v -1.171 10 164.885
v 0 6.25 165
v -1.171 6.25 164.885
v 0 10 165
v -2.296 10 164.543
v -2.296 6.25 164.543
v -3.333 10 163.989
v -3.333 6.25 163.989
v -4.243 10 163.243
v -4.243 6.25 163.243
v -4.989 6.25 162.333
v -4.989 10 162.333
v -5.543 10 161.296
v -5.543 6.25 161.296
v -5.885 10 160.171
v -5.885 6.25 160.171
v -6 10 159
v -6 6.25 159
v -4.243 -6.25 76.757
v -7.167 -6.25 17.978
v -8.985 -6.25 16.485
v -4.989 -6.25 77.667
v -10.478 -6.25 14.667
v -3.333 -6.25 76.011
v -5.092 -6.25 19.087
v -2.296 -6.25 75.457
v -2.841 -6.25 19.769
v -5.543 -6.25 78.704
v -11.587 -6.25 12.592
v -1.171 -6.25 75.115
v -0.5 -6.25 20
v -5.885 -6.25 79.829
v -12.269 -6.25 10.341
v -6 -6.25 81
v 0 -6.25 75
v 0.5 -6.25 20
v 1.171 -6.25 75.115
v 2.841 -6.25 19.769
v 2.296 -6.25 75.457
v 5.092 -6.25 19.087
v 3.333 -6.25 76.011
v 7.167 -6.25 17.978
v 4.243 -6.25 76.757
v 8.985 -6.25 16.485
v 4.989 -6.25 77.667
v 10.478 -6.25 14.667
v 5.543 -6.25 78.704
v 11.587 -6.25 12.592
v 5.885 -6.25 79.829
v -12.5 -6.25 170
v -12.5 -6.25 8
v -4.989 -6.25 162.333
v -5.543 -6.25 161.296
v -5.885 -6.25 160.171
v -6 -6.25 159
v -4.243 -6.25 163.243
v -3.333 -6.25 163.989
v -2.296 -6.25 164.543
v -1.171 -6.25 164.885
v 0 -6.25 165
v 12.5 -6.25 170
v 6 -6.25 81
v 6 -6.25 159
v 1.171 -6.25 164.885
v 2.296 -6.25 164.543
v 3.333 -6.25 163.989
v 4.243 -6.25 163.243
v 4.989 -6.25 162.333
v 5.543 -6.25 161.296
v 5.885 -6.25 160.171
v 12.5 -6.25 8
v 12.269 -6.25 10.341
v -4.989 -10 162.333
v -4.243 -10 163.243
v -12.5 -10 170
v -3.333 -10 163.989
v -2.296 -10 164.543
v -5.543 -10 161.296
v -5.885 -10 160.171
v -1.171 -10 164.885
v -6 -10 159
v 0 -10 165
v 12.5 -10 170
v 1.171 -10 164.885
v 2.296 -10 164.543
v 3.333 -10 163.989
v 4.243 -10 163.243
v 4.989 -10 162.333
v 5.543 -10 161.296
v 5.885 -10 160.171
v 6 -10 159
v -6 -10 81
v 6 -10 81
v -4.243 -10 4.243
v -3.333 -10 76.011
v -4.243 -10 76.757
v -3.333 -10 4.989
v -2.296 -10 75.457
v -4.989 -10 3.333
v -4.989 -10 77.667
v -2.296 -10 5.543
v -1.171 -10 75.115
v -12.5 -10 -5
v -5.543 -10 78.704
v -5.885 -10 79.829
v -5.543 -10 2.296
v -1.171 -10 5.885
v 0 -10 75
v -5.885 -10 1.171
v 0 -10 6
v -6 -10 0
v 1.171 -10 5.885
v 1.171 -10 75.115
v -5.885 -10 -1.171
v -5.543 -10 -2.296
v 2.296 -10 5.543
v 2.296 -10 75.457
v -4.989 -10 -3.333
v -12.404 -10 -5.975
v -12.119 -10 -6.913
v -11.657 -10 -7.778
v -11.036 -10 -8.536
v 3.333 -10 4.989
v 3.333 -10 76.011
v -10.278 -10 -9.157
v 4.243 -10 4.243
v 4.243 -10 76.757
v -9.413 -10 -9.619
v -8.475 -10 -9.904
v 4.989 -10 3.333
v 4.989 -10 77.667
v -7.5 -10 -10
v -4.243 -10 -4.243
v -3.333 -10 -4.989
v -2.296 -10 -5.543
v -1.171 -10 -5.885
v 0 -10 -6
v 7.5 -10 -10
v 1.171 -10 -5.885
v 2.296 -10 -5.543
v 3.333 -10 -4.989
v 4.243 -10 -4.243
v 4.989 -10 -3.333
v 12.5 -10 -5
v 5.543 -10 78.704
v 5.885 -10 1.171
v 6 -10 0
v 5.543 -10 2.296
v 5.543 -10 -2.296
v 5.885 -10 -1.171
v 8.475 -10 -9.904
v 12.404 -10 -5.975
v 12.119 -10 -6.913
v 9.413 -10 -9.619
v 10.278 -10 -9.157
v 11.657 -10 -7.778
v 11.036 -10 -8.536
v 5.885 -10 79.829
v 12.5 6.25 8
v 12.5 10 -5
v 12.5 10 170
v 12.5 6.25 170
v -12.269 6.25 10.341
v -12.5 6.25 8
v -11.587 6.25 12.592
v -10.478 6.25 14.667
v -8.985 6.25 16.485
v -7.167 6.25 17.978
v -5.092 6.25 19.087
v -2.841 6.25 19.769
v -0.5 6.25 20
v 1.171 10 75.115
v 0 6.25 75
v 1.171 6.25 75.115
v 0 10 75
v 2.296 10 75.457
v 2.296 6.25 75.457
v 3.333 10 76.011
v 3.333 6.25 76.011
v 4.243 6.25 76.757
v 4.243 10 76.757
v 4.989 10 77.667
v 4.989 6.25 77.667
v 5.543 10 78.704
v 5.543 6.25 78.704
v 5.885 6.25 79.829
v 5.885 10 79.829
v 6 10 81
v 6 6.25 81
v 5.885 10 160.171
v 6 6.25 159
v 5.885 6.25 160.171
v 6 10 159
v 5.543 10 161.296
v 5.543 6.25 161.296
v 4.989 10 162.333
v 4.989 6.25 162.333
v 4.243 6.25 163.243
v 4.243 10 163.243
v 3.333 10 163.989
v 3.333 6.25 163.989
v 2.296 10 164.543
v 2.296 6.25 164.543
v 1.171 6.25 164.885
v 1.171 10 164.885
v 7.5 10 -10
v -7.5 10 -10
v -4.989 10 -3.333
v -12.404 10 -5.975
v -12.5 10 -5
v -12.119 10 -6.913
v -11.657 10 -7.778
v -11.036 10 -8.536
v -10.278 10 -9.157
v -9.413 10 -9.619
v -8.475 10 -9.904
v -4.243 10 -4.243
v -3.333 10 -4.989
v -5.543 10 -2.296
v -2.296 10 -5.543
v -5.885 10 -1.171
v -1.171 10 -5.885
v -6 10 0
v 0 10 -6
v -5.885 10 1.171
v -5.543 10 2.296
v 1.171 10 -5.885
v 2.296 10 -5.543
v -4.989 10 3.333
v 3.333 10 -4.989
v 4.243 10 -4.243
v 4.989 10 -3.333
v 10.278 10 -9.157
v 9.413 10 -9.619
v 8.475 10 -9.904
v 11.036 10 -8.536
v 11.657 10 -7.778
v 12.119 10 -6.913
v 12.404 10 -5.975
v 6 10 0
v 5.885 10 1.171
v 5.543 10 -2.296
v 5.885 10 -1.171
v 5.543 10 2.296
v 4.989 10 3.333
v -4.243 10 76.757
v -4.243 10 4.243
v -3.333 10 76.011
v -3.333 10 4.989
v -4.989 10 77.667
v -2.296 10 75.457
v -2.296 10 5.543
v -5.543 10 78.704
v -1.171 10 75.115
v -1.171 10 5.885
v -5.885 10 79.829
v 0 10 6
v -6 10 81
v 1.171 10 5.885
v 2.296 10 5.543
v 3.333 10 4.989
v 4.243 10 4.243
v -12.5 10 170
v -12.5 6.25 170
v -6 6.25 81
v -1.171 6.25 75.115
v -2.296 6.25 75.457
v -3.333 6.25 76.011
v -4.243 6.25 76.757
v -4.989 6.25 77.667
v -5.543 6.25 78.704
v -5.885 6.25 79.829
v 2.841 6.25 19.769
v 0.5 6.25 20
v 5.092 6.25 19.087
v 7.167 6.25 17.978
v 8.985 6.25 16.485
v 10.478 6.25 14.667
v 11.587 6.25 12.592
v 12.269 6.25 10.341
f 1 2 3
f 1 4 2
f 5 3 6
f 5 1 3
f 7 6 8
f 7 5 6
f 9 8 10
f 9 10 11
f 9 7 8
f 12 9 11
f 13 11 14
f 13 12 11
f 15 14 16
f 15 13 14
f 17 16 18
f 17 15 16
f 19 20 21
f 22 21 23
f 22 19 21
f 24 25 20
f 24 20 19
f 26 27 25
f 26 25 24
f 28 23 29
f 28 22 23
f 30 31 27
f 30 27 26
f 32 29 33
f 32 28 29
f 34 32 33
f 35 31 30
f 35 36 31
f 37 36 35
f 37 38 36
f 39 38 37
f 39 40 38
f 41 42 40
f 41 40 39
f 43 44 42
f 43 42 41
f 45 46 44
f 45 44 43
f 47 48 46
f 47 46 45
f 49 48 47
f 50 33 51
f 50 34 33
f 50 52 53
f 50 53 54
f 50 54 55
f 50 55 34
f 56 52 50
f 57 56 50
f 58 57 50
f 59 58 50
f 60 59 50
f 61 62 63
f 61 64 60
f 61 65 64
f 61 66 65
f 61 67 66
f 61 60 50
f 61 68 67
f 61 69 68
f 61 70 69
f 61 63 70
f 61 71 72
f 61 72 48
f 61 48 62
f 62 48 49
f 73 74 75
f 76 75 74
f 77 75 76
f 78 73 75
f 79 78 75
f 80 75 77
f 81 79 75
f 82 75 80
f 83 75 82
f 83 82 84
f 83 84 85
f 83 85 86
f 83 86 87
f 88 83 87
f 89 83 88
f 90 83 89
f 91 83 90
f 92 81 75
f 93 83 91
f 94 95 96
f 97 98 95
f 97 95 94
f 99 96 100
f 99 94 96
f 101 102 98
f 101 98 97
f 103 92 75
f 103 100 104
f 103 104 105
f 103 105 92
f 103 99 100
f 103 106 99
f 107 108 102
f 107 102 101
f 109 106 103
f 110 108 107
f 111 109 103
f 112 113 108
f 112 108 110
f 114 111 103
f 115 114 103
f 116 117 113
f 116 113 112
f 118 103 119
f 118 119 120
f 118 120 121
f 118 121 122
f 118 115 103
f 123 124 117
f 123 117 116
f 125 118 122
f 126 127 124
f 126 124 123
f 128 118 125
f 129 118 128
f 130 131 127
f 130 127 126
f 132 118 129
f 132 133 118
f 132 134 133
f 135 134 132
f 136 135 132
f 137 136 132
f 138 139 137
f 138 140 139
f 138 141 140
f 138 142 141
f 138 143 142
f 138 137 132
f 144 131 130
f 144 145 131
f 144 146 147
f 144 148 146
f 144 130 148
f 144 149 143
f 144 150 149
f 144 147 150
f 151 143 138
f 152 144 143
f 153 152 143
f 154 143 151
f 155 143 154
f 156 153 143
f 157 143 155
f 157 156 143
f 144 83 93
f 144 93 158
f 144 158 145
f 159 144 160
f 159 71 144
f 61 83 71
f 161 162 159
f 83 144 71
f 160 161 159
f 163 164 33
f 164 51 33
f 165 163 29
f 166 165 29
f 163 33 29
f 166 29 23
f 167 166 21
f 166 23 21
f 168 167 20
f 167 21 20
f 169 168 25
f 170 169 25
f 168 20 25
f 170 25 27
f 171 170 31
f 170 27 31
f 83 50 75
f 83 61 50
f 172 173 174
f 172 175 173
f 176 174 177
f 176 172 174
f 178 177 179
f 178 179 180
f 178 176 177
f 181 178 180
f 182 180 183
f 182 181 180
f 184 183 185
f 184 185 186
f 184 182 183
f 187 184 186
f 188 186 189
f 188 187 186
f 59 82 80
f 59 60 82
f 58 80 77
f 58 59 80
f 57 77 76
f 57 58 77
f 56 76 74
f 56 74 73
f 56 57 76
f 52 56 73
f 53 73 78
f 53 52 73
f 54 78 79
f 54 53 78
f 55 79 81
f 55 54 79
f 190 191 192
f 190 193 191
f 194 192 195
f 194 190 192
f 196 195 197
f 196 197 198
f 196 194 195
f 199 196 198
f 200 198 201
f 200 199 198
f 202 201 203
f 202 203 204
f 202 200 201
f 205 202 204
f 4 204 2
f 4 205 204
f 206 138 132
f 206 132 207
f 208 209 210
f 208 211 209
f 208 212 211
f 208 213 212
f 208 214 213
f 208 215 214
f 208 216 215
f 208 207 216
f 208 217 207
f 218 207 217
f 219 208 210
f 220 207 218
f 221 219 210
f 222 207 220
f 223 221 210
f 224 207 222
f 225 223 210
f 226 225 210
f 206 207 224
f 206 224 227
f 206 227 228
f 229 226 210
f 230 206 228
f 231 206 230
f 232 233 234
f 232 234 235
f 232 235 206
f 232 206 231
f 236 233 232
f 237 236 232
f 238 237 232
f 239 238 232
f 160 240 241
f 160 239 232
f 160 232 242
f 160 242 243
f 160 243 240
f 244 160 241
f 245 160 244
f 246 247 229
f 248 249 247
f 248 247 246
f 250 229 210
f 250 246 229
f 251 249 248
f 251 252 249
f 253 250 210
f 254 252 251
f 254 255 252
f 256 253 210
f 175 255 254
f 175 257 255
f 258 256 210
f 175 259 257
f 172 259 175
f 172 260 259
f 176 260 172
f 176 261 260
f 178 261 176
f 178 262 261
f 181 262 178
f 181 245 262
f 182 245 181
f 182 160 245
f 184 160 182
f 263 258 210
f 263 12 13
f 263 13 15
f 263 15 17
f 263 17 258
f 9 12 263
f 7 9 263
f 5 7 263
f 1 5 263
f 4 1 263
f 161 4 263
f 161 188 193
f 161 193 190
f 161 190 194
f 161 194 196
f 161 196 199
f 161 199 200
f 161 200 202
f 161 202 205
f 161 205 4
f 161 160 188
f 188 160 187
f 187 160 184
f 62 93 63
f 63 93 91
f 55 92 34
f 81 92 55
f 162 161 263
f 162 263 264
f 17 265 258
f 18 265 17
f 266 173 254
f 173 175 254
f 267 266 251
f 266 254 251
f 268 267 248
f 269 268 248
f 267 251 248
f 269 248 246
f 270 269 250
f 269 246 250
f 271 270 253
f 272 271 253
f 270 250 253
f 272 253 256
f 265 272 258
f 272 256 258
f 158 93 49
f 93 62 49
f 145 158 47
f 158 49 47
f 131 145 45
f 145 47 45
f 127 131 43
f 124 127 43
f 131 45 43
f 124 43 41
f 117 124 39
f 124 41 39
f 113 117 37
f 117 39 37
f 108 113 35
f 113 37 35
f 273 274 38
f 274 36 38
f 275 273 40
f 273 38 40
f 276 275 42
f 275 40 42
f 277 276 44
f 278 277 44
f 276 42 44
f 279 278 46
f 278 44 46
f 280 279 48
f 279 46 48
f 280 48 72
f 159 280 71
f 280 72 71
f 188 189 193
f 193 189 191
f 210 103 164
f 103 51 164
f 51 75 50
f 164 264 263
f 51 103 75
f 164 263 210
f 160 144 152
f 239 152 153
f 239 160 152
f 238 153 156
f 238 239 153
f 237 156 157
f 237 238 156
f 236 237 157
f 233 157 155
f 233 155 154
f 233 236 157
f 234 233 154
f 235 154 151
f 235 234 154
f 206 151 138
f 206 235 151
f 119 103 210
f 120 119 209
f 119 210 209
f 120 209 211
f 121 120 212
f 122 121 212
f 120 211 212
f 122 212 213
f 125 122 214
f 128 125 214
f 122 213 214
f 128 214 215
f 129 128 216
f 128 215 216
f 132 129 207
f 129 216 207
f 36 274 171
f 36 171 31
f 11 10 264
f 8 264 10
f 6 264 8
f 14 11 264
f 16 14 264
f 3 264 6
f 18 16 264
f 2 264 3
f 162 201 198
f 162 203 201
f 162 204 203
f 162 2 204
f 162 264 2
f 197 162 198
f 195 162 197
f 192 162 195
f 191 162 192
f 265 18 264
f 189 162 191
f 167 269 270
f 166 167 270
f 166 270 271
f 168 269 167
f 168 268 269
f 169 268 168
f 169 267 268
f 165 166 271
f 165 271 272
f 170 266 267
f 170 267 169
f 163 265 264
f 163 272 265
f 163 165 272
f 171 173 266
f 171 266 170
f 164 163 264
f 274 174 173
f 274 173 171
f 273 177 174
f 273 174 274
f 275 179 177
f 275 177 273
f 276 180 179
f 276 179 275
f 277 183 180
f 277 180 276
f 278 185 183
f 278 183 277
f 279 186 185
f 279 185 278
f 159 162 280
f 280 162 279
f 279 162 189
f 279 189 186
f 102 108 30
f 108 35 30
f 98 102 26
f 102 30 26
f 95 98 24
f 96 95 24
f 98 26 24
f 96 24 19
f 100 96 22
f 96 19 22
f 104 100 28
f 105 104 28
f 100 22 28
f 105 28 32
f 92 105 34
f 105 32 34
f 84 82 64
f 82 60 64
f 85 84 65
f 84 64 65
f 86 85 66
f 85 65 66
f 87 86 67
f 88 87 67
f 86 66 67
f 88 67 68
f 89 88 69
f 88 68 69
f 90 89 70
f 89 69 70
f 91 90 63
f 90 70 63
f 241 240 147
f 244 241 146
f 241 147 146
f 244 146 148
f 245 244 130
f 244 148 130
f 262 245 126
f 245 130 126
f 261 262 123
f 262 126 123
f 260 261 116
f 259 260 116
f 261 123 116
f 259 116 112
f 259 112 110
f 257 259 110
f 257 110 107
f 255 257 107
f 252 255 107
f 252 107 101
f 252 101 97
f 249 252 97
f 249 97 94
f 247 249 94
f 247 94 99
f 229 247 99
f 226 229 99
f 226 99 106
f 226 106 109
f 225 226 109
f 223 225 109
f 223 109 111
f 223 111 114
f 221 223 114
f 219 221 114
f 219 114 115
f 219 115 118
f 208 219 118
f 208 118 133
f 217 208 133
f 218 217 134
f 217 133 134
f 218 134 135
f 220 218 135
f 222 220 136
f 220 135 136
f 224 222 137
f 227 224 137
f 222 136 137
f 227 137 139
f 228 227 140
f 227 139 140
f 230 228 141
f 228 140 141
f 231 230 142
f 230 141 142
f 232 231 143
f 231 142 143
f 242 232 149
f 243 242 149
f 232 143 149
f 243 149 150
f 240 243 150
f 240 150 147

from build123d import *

# Parameters (mm, degrees)
F1_DEPTH = 12.5
F2_R     = 6
F3_DEPTH = 20.001
F4_R     = 5
F5_R     = 12
F6_W     = 12
F6_H     = 90
F7_DEPTH = 20.001
F8_R     = 5.99999


# Not quite as in the source:
# - a fillet or chamfer is up to 0.001 mm smaller than in the source, because OpenCascade refuses the exact size


with BuildPart() as f1:
    # F0 (on Right) → F1 (new body, symmetric)
    with BuildSketch(Plane.YZ):
        Polygon((-6.25, 170), (-10, 170), (-10, -10), (10, -10), (10, 170), (6.25, 170), (6.25, 20), (-6.25, 20), align=None)
    extrude(amount=F1_DEPTH, both=True)

    # F2 (on face) → F3 (cut, through all)
    with BuildSketch(Plane.XZ.offset(10)):
        Circle(F2_R)
    extrude(amount=-F3_DEPTH, mode=Mode.SUBTRACT)

    # F4
    f4_edges = [f1.edges().sort_by_distance(p)[0] for p in [
        (12.5, 0, -10),
        (-12.5, 0, -10),
    ]]
    fillet(f4_edges, radius=F4_R)

    # F5
    f5_edges = [f1.edges().sort_by_distance(p)[0] for p in [
        (12.5, 0, 20),
        (-12.5, 0, 20),
    ]]
    fillet(f5_edges, radius=F5_R)

    # F6 (on face) → F7 (cut, through all)
    with BuildSketch(Plane.XZ.offset(10)):
        with Locations((0, 120)):
            Rectangle(F6_W, F6_H)
    extrude(amount=-F7_DEPTH, mode=Mode.SUBTRACT)

    # F8 (radius 6 in the source; OpenCascade refuses exactly that, so slightly less here)
    f8_edges = [f1.edges().sort_by_distance(p)[0] for p in [
        (-6, -8.125, 165),
        (6, -8.125, 165),
        (6, -8.125, 75),
        (-6, -8.125, 75),
        (-6, 8.125, 75),
        (6, 8.125, 75),
        (6, 8.125, 165),
        (-6, 8.125, 165),
    ]]
    fillet(f8_edges, radius=F8_R)


solid = f1.part
